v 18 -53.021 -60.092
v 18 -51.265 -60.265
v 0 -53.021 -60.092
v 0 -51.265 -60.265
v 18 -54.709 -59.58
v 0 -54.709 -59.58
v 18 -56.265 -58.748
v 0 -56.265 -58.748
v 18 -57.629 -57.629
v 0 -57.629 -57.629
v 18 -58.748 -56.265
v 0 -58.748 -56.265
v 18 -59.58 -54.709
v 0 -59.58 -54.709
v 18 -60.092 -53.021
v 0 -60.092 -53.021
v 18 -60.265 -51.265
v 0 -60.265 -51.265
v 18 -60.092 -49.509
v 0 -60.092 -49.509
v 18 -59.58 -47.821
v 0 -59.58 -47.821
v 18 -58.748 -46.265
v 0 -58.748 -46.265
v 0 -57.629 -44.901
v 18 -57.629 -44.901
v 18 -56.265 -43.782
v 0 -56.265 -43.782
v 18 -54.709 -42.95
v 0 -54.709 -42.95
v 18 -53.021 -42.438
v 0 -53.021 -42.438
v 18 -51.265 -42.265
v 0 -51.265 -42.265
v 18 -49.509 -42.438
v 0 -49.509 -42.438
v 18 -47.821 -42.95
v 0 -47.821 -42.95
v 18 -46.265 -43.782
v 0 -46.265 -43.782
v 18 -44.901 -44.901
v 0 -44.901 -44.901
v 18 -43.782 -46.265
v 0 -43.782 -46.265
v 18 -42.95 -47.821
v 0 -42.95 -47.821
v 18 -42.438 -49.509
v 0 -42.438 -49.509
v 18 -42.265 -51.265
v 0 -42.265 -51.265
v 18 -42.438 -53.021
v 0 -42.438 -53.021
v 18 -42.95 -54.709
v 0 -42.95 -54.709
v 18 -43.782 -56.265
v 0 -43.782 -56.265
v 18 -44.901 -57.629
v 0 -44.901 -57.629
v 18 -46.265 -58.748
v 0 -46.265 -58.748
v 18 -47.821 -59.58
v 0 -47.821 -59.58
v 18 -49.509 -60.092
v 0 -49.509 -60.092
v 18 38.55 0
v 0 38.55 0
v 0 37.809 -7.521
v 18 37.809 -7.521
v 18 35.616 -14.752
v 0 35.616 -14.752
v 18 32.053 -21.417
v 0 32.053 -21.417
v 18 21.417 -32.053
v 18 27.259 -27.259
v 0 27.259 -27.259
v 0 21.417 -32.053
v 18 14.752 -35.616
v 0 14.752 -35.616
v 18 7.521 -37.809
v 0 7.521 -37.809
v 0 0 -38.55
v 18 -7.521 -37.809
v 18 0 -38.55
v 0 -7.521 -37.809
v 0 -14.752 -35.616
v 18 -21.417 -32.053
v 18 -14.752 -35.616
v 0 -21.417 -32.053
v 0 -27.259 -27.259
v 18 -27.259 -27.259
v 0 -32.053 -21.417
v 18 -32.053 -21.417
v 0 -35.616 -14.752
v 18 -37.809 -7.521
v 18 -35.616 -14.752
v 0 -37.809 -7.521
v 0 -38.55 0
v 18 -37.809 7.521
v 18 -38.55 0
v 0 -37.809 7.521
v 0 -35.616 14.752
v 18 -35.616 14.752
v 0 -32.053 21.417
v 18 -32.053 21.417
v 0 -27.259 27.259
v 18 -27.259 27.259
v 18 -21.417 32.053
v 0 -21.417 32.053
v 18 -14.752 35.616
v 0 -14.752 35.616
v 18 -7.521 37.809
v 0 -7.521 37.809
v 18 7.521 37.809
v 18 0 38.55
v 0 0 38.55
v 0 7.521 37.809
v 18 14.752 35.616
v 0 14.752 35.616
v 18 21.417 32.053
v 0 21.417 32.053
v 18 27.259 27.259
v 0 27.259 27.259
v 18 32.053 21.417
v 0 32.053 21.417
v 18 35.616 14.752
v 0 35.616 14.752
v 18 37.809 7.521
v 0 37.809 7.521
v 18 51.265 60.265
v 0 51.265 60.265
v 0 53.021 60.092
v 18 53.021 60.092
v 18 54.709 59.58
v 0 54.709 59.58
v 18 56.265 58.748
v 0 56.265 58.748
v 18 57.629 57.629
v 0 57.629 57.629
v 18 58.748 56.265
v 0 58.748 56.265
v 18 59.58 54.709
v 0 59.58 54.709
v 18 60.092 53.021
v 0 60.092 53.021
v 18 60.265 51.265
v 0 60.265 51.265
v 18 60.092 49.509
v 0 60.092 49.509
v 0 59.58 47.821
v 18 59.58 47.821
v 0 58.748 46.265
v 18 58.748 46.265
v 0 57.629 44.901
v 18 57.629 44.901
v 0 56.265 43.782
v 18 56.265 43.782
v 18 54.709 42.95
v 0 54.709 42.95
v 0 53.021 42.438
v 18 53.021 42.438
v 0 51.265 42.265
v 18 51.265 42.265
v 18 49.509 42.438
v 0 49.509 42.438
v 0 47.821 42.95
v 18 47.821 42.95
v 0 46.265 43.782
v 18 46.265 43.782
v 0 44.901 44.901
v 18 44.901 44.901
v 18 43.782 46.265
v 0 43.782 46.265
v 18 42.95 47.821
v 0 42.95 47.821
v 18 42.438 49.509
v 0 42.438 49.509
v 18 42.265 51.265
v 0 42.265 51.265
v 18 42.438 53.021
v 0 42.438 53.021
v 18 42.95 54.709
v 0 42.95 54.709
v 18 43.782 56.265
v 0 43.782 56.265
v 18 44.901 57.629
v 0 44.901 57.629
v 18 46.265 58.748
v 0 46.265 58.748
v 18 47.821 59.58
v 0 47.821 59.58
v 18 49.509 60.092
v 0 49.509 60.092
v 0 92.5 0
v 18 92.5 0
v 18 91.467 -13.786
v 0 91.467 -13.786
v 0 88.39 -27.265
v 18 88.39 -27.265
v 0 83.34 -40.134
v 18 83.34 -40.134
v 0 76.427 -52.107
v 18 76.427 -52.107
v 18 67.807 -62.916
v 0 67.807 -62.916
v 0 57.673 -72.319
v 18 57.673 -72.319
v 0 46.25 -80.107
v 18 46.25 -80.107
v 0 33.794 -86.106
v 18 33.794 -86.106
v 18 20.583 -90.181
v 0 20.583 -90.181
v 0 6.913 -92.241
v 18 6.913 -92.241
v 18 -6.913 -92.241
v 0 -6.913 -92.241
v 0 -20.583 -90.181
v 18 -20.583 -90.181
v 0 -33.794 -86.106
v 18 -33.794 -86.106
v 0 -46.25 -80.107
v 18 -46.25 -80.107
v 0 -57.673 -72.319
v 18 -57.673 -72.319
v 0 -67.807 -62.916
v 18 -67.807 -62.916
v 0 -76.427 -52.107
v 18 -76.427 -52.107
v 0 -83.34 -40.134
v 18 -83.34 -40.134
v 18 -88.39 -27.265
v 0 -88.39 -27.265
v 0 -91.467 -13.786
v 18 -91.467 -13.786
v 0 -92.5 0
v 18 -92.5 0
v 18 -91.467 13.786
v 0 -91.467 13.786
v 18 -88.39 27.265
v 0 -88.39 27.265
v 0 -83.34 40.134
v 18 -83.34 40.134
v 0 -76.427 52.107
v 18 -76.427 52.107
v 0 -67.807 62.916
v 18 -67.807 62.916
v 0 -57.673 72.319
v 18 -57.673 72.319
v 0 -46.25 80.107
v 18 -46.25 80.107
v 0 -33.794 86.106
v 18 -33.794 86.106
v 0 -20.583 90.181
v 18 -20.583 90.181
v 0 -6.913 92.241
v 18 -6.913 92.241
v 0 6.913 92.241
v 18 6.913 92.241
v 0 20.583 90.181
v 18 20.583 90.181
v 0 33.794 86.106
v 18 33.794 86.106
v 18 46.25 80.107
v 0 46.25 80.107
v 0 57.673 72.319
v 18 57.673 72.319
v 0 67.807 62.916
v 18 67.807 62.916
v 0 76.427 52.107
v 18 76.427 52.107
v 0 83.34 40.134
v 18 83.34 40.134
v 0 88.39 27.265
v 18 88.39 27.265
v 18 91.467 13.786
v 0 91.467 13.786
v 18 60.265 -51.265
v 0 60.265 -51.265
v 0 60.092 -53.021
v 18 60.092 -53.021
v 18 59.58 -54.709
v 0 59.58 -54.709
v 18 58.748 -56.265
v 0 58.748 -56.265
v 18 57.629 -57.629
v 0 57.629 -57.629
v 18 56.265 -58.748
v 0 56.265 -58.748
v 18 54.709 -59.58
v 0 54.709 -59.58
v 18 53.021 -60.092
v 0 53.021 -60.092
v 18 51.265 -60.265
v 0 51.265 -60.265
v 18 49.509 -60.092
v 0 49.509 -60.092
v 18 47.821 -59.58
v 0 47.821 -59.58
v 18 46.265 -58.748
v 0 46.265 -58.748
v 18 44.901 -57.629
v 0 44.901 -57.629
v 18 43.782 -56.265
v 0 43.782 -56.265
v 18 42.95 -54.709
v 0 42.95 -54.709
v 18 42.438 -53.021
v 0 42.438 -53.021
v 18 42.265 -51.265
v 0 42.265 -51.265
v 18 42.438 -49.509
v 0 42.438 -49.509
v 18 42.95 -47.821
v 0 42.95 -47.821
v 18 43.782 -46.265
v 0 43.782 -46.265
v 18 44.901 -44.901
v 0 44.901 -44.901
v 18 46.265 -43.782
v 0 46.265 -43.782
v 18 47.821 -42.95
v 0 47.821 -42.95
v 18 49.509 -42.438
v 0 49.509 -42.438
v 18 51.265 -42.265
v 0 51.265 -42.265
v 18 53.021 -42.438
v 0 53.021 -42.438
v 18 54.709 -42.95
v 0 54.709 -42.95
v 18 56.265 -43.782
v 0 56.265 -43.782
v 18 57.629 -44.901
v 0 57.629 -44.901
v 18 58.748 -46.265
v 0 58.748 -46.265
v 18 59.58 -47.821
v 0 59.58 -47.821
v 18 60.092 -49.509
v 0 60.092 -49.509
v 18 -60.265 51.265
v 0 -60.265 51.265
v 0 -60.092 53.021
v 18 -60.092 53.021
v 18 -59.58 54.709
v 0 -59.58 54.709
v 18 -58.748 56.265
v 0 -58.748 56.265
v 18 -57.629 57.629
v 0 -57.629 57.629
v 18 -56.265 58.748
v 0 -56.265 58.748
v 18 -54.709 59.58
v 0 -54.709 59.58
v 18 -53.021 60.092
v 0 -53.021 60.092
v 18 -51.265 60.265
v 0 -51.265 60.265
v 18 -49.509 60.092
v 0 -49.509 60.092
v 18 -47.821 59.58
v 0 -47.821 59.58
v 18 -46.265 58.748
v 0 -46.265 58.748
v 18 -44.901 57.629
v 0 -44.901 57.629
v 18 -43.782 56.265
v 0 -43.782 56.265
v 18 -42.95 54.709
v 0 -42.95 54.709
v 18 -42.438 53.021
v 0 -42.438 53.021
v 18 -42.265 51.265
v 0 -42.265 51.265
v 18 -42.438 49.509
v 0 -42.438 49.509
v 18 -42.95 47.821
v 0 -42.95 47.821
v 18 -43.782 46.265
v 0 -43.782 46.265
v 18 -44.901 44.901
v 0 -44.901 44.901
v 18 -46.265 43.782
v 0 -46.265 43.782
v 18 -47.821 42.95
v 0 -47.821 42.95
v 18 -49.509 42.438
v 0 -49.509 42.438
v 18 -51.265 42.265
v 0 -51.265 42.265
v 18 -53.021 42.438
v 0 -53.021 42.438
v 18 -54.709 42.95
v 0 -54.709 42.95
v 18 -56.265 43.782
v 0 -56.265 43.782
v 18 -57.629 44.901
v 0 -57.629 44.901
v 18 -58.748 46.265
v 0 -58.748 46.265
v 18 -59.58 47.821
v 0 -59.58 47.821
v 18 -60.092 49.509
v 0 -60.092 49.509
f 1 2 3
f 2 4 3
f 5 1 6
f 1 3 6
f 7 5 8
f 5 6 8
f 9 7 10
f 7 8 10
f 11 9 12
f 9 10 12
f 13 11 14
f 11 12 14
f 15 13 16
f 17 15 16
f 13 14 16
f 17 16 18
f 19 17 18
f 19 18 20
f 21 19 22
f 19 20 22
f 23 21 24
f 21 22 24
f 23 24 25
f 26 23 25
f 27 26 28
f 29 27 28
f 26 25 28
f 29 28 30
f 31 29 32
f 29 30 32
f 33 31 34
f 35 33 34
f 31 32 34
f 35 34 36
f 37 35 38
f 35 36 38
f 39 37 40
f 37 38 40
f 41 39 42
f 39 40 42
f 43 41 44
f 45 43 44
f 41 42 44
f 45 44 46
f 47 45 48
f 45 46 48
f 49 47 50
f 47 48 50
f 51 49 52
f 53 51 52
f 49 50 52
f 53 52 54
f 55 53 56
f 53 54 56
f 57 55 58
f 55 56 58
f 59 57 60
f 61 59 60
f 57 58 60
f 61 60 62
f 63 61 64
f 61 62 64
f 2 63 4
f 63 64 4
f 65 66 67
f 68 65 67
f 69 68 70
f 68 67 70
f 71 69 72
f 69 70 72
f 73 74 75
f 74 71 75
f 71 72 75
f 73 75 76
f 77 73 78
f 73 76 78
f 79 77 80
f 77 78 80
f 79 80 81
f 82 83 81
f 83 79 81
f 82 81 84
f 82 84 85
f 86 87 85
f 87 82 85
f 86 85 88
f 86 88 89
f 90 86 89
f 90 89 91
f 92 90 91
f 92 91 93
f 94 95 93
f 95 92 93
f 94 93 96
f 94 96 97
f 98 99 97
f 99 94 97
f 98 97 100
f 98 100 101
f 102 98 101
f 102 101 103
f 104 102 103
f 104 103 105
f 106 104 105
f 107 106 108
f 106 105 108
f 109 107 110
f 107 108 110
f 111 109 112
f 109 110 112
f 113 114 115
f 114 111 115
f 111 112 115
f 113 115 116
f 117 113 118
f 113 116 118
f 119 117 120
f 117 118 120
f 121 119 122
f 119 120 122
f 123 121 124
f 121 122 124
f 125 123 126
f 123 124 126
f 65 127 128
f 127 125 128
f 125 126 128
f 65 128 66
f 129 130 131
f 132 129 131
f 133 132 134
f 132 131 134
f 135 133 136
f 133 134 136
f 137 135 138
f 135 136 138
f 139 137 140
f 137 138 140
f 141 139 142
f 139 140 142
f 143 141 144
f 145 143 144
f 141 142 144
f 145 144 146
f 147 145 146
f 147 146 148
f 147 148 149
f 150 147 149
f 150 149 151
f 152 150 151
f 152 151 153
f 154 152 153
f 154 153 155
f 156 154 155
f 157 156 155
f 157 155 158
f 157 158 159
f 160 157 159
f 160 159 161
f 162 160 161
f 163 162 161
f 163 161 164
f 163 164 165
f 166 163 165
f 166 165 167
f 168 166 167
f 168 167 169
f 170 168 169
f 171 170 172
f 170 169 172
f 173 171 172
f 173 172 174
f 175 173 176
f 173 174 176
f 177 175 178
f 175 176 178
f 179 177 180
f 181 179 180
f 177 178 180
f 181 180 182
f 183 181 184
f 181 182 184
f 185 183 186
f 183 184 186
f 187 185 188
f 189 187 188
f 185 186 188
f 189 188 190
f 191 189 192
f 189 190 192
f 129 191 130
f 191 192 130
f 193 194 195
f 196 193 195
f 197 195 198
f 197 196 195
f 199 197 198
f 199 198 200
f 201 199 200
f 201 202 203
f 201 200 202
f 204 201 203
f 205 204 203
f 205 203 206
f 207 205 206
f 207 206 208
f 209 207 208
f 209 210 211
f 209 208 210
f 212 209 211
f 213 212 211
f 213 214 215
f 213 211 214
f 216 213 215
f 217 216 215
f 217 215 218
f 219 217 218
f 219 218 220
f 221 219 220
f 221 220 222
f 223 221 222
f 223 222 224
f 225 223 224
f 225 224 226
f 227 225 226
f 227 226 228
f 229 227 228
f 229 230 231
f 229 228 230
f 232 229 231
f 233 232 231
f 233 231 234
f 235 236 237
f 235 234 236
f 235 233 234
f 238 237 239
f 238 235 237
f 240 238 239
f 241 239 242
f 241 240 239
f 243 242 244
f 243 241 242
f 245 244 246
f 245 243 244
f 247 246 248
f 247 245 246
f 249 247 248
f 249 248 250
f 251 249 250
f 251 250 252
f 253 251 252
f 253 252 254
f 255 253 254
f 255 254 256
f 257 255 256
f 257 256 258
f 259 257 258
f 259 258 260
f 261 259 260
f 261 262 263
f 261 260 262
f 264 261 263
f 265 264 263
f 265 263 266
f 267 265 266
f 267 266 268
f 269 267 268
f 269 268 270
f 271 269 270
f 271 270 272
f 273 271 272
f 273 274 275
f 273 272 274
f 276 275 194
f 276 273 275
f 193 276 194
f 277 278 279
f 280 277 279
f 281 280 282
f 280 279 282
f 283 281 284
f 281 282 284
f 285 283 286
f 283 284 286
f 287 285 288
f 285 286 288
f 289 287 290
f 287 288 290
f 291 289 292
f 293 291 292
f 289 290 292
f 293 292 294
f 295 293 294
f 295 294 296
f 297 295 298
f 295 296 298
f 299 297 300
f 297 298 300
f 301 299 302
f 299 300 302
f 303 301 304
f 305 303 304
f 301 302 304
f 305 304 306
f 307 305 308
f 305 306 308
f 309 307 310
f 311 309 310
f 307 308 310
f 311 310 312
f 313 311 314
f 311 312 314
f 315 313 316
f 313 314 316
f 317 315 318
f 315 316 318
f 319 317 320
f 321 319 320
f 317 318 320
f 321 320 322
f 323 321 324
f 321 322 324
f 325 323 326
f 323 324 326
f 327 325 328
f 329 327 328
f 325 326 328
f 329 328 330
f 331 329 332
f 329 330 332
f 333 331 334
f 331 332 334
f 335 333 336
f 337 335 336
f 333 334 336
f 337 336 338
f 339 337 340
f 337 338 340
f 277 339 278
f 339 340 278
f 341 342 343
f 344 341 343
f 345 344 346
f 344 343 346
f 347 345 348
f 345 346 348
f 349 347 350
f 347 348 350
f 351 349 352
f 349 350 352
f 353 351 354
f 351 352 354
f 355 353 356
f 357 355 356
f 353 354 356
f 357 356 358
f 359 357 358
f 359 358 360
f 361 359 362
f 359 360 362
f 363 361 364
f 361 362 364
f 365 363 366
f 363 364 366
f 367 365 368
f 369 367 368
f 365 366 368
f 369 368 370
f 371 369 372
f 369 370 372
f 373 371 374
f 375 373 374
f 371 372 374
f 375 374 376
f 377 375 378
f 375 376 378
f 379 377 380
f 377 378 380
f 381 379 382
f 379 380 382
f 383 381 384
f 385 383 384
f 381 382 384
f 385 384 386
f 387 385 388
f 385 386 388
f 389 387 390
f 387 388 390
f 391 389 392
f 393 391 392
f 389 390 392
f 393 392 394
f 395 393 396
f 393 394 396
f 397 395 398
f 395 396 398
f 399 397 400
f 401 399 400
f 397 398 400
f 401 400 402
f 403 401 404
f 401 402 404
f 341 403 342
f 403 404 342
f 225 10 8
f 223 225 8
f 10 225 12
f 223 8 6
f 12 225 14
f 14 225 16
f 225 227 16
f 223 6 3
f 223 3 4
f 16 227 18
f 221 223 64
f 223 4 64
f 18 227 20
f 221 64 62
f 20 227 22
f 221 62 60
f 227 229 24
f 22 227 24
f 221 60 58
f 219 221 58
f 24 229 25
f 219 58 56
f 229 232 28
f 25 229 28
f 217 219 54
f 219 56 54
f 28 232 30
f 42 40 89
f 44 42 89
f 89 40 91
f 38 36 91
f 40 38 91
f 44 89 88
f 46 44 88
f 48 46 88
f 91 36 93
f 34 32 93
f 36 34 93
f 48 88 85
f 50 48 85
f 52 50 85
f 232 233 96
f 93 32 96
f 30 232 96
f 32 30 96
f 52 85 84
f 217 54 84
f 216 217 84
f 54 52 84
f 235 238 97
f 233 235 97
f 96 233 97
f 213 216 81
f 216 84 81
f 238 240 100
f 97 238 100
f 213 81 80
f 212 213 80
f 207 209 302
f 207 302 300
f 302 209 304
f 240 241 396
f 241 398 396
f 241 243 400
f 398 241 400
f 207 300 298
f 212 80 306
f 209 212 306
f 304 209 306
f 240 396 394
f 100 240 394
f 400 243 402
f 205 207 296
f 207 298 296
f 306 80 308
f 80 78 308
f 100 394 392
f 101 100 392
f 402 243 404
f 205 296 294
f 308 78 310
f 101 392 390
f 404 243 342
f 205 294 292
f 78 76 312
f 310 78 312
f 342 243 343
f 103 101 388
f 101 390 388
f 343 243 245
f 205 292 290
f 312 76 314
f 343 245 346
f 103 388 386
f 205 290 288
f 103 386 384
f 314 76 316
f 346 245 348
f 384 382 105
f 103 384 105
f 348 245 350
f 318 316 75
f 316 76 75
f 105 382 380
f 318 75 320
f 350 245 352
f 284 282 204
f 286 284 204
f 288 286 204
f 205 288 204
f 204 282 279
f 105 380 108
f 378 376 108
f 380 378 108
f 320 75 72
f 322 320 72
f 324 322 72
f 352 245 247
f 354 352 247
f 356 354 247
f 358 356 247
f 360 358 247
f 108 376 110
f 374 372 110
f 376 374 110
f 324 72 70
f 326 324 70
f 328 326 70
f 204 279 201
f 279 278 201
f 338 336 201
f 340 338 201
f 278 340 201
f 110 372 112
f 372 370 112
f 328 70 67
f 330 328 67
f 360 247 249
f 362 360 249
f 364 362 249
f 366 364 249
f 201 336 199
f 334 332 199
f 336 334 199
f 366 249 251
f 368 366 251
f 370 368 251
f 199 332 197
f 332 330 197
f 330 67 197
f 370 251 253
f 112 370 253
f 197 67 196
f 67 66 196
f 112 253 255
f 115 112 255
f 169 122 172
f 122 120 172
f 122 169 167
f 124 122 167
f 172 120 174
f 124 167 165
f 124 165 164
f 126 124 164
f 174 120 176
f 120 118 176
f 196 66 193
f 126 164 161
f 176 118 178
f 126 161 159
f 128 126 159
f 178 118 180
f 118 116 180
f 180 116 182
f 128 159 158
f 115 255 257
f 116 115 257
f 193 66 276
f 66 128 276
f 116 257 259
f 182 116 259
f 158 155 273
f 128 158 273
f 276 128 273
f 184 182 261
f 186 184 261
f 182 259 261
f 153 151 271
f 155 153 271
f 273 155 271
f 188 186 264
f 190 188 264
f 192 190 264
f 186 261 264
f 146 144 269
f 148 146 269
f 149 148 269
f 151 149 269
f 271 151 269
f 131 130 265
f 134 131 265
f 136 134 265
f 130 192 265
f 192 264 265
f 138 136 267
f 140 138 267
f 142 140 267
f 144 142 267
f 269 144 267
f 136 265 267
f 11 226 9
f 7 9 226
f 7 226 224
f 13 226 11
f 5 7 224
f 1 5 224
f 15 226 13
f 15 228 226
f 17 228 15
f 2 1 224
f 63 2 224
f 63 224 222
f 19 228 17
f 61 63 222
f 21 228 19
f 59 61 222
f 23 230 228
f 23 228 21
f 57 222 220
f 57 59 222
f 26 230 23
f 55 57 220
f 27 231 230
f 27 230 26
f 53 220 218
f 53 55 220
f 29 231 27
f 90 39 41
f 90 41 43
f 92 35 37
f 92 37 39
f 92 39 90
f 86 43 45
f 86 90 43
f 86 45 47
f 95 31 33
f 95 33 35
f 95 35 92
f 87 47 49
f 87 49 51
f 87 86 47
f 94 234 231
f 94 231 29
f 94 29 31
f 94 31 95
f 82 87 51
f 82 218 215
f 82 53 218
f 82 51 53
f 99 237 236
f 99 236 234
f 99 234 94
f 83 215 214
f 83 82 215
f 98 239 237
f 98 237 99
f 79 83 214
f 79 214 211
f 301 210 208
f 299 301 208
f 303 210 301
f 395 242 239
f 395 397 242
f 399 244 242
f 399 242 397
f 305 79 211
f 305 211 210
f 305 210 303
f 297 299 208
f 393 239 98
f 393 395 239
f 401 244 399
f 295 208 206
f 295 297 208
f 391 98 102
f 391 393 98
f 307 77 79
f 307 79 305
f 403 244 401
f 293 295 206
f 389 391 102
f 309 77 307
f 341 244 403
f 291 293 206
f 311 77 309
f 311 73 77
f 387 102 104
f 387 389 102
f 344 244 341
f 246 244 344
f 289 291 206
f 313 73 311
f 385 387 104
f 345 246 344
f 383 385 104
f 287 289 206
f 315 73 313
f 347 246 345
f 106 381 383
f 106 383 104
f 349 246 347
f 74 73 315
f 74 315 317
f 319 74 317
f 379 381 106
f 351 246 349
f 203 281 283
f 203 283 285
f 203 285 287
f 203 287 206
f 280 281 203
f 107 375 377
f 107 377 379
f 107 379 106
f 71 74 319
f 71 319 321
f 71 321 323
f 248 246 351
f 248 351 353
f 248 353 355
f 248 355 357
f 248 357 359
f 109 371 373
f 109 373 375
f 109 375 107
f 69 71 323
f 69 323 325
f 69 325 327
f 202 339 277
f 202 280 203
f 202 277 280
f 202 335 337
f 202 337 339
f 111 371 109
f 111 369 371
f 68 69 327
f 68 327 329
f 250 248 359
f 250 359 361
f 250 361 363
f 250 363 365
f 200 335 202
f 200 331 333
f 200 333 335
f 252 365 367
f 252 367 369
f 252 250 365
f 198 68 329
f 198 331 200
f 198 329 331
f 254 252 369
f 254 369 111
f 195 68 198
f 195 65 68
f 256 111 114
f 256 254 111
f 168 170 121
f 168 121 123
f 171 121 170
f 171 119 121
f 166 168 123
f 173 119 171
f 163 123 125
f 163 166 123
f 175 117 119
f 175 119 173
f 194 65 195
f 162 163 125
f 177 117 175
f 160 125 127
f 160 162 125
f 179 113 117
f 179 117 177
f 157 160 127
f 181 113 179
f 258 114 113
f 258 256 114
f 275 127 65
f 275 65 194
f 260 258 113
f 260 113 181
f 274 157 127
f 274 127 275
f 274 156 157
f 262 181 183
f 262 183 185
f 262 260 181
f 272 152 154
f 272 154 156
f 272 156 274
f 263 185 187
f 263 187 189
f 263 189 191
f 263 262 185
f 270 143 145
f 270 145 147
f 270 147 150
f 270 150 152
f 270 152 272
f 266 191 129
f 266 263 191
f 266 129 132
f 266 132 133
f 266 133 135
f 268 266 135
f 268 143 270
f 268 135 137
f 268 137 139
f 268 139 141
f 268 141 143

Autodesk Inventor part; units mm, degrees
ref_plane "YZ Plane" through (0, 0, 0) normal (1, 0, 0) x (0, 1, 0)
ref_plane "XZ Plane" through (0, 0, 0) normal (0, 1, 0) x (-1, 0, 0)
ref_plane "XY Plane" through (0, 0, 0) normal (0, 0, 1) x (1, 0, 0)
sketch "Sketch1" plane through (0, 0, 0) normal (0, 0, 1) x (1, 0, 0)
  line L0 (18, 92.5) -> (0, 92.5)
  line L1 (0, 92.5) -> (0, 38.55)
  line L2 (0, 38.55) -> (0, 0) construction
  line L3 (0, 0) -> (18, 0) construction
  line L4 (18, 92.5) -> (18, 38.55)
  line L5 (18, 38.55) -> (0, 38.55)
  line L6 (18, 38.55) -> (18, 0) construction
  dimension "d0" = 185
  dimension "d1" = 18
  dimension "d5" = 77.1
revolve "Revolution1" add sketch "Sketch1" angle 360 about axis through (0, 0, 0) along (1, 0, 0)
sketch "Sketch2" plane through (0, 0, 0) normal (-1, 0, 0) x (0, 0, 1)
  circle A0 centre (0, 0) radius 38.55 projected
  line L0 (0, 72.5) -> (0, 0) construction
  circle A1 centre (0, 0) radius 92.5 projected
  circle A2 centre (0, 0) radius 72.5 construction
  line L1 (0, 0) -> (51.2652, 51.2652) construction
  circle A3 centre (51.2652, 51.2652) radius 9
  dimension "d6" = 18
  dimension "d7" = 72.5
  dimension "d8" = 45
extrude "Extrusion1" cut sketch "Sketch2" against normal through all contours A3
pattern_circular "Circular Pattern1" count 4 over 360 about axis through (9, 0, 0) along (1, 0, 0) of "Extrusion1"
equation "\"d6\" = dd2"
equation "\"d7\" = 0.5 * k"
equation "\"d0\" = D"
equation "\"d1\" = b"
equation "\"d5\" = dd5"
equation "\"b\" = 18"
equation "\"D\" = 185"
equation "\"k\" = 145"
equation "\"dd2\" = 18"
equation "\"dd5\" = 77.1"
equation "\"Size_Designation\" = 1.2345"
properties part number "DIN 2576 Slip-On Flange for Welding Series 1 (ISO) - PN 10 65 x 76.1" material "Steel"
